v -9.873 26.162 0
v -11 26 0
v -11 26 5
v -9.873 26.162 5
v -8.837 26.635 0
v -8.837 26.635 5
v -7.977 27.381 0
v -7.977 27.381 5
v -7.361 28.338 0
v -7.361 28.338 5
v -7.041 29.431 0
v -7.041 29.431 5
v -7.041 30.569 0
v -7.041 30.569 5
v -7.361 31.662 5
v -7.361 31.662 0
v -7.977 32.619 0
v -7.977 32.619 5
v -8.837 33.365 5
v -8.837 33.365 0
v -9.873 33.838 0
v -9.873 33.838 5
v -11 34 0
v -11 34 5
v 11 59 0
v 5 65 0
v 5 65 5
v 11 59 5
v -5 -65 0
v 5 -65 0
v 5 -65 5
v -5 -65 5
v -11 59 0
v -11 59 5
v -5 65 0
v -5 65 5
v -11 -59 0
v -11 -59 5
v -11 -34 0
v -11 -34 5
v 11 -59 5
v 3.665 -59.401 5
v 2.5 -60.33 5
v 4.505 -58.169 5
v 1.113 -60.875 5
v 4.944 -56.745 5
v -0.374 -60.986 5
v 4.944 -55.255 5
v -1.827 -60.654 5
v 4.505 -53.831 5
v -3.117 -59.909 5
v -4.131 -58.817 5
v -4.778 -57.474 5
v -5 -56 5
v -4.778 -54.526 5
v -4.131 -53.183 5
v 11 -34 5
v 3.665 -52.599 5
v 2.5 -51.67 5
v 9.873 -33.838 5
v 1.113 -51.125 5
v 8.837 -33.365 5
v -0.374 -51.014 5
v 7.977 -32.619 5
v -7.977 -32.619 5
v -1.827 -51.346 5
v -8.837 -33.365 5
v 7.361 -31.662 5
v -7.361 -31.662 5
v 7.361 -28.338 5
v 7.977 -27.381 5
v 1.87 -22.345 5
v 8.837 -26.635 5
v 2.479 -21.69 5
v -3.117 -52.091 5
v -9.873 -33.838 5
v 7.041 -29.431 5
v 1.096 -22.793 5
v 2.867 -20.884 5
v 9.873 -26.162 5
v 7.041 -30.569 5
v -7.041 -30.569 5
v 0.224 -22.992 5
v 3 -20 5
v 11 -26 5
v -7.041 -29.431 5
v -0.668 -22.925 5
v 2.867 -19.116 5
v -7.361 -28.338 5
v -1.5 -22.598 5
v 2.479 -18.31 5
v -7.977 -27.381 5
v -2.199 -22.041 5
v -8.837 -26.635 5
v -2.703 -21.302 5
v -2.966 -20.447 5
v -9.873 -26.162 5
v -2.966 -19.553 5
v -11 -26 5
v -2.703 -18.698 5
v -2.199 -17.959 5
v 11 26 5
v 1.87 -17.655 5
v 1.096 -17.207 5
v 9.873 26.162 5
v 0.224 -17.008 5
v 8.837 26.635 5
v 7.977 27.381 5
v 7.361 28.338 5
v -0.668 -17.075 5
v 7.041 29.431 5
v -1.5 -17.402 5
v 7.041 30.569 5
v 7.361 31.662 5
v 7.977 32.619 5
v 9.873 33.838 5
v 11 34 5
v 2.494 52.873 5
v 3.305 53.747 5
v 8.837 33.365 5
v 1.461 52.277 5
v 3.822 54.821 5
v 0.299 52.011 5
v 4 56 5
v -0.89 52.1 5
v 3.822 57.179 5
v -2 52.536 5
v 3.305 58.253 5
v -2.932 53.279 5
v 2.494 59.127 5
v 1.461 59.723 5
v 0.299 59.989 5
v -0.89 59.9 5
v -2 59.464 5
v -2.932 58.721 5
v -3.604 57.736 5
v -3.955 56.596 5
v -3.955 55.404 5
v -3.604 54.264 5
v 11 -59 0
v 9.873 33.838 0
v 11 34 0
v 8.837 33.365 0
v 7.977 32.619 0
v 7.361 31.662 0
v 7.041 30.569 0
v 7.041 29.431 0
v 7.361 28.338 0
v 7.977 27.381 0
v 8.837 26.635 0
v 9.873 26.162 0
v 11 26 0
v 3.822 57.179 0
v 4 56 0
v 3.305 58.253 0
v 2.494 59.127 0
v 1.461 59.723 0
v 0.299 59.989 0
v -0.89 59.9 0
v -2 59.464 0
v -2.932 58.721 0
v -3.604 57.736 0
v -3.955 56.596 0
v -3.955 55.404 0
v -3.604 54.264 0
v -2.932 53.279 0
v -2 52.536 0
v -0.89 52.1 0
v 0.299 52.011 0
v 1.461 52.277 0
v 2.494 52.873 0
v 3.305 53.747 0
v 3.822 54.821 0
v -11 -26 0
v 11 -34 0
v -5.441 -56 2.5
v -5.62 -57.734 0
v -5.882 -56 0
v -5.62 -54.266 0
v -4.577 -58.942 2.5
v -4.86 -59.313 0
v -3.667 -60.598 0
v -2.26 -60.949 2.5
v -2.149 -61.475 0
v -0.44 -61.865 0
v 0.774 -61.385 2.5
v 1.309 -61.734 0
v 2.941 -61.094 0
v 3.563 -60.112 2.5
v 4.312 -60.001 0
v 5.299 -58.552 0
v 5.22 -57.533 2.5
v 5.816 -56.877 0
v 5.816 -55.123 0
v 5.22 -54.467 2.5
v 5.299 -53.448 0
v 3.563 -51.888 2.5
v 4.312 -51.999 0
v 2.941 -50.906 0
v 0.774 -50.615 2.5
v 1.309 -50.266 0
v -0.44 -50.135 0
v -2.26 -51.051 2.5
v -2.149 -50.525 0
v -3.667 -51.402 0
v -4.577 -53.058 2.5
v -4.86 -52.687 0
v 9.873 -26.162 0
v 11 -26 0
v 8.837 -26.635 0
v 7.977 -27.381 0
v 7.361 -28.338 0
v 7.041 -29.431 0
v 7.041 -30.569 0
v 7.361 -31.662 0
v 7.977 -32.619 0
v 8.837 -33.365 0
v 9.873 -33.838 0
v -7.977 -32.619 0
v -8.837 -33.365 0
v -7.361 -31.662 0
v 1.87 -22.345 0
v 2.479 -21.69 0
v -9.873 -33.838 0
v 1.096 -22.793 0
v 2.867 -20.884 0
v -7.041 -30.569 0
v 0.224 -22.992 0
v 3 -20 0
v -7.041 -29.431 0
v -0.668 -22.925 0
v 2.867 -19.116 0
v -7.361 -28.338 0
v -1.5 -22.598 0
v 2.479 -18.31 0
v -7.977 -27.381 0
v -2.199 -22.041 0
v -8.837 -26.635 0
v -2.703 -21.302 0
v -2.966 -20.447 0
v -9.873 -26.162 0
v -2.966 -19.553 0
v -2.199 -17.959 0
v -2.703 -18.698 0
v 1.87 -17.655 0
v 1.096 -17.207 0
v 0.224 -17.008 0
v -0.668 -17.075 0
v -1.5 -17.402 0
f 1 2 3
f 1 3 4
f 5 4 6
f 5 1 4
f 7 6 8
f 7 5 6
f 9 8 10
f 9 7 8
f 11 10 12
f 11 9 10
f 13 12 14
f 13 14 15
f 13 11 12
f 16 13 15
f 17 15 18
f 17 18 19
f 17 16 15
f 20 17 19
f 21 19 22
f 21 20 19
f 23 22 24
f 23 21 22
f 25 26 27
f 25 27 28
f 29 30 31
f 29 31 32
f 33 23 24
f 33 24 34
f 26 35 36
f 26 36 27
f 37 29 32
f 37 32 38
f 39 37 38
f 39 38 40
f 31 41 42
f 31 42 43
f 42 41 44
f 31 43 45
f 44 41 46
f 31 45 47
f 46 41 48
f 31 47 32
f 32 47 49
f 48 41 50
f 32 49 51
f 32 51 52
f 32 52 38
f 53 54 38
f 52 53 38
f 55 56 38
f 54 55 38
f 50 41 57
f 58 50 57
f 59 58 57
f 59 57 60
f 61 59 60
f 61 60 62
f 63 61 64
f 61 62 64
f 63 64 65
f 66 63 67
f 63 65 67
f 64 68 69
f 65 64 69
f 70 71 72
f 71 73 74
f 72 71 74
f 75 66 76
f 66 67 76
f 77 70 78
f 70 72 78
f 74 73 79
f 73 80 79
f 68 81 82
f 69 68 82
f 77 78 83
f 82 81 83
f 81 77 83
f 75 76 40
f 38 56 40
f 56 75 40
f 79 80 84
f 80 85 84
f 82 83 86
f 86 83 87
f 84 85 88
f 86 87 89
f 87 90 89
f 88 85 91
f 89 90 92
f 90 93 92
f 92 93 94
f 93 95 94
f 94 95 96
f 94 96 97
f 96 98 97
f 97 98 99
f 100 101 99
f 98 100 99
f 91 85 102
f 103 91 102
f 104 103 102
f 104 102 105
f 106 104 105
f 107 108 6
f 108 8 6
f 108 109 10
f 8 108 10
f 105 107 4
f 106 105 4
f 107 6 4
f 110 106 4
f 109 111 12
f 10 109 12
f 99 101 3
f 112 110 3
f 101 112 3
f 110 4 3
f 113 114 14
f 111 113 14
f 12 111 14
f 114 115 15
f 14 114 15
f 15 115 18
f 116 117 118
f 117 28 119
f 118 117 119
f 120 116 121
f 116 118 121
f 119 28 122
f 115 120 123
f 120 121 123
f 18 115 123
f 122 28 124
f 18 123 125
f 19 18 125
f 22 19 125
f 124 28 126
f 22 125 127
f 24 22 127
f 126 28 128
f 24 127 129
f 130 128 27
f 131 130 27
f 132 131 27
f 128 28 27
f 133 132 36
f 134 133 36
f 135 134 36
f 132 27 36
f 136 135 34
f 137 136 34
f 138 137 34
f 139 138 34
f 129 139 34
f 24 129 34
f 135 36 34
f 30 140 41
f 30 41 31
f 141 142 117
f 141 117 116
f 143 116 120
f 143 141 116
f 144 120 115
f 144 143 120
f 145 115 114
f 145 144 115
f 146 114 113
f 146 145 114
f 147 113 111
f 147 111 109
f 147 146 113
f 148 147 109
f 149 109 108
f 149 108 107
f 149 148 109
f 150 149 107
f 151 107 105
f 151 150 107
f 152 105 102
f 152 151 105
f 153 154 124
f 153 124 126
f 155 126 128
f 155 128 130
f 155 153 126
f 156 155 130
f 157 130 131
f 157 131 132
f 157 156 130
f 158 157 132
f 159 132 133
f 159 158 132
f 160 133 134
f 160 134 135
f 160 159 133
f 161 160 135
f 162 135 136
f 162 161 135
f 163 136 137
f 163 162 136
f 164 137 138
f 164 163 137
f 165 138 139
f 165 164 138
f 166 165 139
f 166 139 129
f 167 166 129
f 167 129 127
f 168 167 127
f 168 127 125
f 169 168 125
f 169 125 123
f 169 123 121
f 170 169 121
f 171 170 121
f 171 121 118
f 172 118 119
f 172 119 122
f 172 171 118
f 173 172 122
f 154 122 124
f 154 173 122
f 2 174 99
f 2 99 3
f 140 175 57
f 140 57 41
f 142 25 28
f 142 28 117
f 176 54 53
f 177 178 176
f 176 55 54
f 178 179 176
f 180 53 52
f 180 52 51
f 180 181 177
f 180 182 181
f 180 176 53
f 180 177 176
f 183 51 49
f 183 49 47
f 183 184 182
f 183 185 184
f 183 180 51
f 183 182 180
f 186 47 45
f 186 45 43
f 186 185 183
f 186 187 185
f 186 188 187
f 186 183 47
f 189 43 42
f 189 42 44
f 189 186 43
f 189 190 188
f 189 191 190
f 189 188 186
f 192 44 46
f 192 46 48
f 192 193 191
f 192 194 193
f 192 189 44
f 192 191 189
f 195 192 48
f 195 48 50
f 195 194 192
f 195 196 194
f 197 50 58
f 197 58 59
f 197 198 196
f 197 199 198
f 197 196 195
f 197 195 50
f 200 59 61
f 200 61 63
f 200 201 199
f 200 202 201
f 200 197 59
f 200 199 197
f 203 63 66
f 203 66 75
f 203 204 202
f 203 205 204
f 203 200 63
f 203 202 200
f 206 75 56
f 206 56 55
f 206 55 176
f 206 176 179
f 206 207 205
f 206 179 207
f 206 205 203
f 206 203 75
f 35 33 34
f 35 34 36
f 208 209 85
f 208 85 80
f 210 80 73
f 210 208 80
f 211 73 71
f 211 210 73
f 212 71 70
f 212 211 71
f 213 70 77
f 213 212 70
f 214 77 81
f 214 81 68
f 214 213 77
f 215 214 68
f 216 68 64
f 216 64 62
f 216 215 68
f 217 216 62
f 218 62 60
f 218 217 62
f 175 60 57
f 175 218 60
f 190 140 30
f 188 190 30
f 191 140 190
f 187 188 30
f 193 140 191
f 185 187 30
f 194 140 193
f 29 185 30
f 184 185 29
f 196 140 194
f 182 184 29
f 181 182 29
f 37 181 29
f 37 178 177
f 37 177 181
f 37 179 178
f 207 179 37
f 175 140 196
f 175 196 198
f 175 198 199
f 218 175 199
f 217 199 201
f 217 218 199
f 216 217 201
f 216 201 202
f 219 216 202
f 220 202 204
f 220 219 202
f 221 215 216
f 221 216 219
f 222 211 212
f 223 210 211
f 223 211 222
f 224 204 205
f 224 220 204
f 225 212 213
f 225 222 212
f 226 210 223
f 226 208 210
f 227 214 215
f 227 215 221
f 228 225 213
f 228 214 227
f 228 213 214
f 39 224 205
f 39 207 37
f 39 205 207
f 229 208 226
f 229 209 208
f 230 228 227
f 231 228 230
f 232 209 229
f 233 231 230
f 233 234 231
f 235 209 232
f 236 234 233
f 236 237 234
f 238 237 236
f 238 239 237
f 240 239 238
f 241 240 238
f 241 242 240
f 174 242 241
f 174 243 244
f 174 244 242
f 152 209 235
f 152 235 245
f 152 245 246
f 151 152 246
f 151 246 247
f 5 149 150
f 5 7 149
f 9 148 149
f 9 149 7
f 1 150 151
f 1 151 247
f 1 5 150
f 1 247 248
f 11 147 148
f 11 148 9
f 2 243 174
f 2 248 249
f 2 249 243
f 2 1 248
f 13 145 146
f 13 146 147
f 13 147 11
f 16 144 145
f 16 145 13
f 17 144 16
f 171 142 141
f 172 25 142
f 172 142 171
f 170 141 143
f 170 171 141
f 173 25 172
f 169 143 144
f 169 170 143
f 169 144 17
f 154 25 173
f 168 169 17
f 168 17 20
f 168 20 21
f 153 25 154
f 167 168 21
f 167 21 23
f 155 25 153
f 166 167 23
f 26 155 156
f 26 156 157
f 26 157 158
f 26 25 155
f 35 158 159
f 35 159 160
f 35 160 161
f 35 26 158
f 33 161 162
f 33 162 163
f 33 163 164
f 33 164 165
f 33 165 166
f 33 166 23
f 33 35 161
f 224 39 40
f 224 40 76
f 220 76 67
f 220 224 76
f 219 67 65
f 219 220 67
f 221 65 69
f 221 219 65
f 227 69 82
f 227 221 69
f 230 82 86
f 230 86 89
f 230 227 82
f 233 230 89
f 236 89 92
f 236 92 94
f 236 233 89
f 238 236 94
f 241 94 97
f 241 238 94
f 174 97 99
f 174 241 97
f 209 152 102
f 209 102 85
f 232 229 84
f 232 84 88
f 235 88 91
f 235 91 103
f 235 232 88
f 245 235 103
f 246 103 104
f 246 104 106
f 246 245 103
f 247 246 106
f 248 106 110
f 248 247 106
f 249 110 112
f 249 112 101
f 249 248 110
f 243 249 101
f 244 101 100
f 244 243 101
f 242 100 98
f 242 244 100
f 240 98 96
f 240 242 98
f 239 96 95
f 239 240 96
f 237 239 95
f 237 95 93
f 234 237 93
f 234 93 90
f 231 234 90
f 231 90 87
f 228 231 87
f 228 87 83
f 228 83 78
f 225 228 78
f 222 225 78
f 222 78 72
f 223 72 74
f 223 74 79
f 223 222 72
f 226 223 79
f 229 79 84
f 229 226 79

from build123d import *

# Parameters (mm, degrees)
ESQUISSE1_R      = 4
ESQUISSE1_R_2    = 3
EXTRUSION1_DEPTH = 5


with BuildPart() as part:
    # Esquisse1 → Extrusion1 (new body)
    with BuildSketch(Plane.XY):
        with BuildLine():
            Line((-5, 65), (5, 65))
            Line((5, 65), (11, 59))
            Line((11, 59), (11, 34))
            ThreePointArc((11, 34), (7, 30), (11, 26))
            Line((11, 26), (11, -26))
            ThreePointArc((11, -26), (7, -30), (11, -34))
            Line((11, -34), (11, -59))
            Line((11, -59), (5, -65))
            Line((5, -65), (-5, -65))
            Line((-5, -65), (-11, -59))
            Line((-11, -59), (-11, -34))
            ThreePointArc((-11, -34), (-7, -30), (-11, -26))
            Line((-11, -26), (-11, 26))
            ThreePointArc((-11, 26), (-7, 30), (-11, 34))
            Line((-11, 34), (-11, 59))
            Line((-11, 59), (-5, 65))
        make_face()
        with Locations((0, 56)):
            Circle(ESQUISSE1_R, mode=Mode.SUBTRACT)
        with Locations((0, -20)):
            Circle(ESQUISSE1_R_2, mode=Mode.SUBTRACT)
    extrude(amount=EXTRUSION1_DEPTH)

    # Esquisse2 → Enlèvement de matière-Révolution1 (revolve, cut)
    with BuildSketch(Plane(origin=(0, 0, 0), x_dir=(0, 0, -1), z_dir=(1, 0, 0)), mode=Mode.PRIVATE) as enl_vement_de_mati_re_r_volution1_sk:
        Polygon((-5, -51), (0, -50.118365096), (0, -52.065498843), (0, -56), (-5, -56), align=None)
    revolve(enl_vement_de_mati_re_r_volution1_sk.sketch.rotate(Axis((0, -56, -5.75818426), (0, 0, 1)), 90), axis=Axis((0, -56, -5.75818426), (0, 0, 1)), mode=Mode.SUBTRACT)


solid = part.part
